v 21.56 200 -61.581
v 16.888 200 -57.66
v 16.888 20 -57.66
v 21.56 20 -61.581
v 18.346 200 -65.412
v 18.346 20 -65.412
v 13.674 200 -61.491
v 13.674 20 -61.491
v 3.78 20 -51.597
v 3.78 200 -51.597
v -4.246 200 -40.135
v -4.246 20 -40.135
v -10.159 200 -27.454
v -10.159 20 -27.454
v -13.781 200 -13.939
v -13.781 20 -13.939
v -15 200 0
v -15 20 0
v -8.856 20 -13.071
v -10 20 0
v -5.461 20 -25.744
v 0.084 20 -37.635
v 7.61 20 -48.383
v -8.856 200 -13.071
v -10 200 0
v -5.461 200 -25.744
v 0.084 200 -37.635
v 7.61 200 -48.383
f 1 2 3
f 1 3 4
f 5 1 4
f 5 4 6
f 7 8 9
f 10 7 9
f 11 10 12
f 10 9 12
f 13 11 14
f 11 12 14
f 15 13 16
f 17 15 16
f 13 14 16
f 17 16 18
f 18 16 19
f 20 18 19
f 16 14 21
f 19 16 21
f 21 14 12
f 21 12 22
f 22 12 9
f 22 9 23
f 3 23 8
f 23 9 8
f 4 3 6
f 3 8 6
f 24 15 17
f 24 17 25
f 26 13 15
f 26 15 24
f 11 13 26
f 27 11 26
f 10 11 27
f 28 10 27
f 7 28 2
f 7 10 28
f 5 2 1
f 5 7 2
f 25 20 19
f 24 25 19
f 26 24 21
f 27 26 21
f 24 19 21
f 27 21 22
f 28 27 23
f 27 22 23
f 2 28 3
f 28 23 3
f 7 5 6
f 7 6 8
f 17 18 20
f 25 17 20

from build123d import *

# Parameters (mm, degrees)
SKETCH1_R           = 2.6
BOSS_EXTRUDE1_DEPTH = 20
BOSS_EXTRUDE2_DEPTH = 20
BOSS_EXTRUDE3_DEPTH = 180
CUT_EXTRUDE1_DEPTH  = 195.584574731


with BuildPart() as part:
    # Sketch1 → Boss-Extrude1 (new body)
    with BuildSketch(Plane(origin=(0, 0, 0), x_dir=(1, 0, 0), z_dir=(0, 1, 0))):
        with BuildLine():
            Line((10, 0), (-10, 0))
            ThreePointArc((-10, 0), (-2.947752983, 31.810630591), (16.887506811, 57.660444431))
            Line((16.887506811, 57.660444431), (29.743259005, 42.339555569))
            ThreePointArc((29.743259005, 42.339555569), (15.178402758, 23.358265357), (10, 0))
        make_face()
        with Locations(Location((0.770593323, 10, 0), (0, 0, 270))):
            Circle(SKETCH1_R, mode=Mode.SUBTRACT)
        with Locations(Location((6.115324888, 27.584447974, 0), (0, 0, 270))):
            Circle(SKETCH1_R, mode=Mode.SUBTRACT)
        with Locations(Location((16.150266317, 42.98181517, 0), (0, 0, 270))):
            Circle(SKETCH1_R, mode=Mode.SUBTRACT)
    extrude(amount=BOSS_EXTRUDE1_DEPTH)

    # Sketch2 → Boss-Extrude2 (add)
    with BuildSketch(Plane(origin=(0, 20, 0), x_dir=(1, 0, 0), z_dir=(0, 1, 0))):
        Polygon((16.887506811, 57.660444431), (29.743259005, 42.339555569), (34.416130108, 46.260559988), (21.560377914, 61.58144885), align=None)
    extrude(amount=-BOSS_EXTRUDE2_DEPTH)

    # Sketch4 → Cut-Extrude1 (cut, through all)
    with BuildSketch(Plane(origin=(0, 20, 0), x_dir=(1, 0, 0), z_dir=(0, 1, 0))):
        with BuildLine():
            Line((29.743259005, 42.339555569), (34.416130108, 46.260559988))
            Line((34.416130108, 46.260559988), (21.560377914, 61.58144885))
            Line((21.560377914, 61.58144885), (16.887506811, 57.660444431))
            ThreePointArc((16.887506811, 57.660444431), (-2.947752983, 31.810630591), (-10, 0))
            Line((-10, 0), (10, 0))
            ThreePointArc((10, 0), (15.178402758, 23.358265357), (29.743259005, 42.339555569))
        make_face()
    extrude(amount=-CUT_EXTRUDE1_DEPTH, mode=Mode.SUBTRACT)


with BuildPart() as body_2:
    # Sketch3 → Boss-Extrude3 (new body)
    with BuildSketch(Plane(origin=(0, 20, 0), x_dir=(1, 0, 0), z_dir=(0, 1, 0))):
        with BuildLine():
            Line((18.346439865, 65.411671066), (13.673568762, 61.490666647))
            ThreePointArc((13.673568762, 61.490666647), (-7.479291918, 33.9237219), (-15, 0))
            Line((-15, 0), (-10, 0))
            ThreePointArc((-10, 0), (-2.947752983, 31.810630591), (16.887506811, 57.660444431))
            Line((16.887506811, 57.660444431), (21.560377914, 61.58144885))
            Line((21.560377914, 61.58144885), (18.346439865, 65.411671066))
        make_face()
    extrude(amount=BOSS_EXTRUDE3_DEPTH)


solid = body_2.part
